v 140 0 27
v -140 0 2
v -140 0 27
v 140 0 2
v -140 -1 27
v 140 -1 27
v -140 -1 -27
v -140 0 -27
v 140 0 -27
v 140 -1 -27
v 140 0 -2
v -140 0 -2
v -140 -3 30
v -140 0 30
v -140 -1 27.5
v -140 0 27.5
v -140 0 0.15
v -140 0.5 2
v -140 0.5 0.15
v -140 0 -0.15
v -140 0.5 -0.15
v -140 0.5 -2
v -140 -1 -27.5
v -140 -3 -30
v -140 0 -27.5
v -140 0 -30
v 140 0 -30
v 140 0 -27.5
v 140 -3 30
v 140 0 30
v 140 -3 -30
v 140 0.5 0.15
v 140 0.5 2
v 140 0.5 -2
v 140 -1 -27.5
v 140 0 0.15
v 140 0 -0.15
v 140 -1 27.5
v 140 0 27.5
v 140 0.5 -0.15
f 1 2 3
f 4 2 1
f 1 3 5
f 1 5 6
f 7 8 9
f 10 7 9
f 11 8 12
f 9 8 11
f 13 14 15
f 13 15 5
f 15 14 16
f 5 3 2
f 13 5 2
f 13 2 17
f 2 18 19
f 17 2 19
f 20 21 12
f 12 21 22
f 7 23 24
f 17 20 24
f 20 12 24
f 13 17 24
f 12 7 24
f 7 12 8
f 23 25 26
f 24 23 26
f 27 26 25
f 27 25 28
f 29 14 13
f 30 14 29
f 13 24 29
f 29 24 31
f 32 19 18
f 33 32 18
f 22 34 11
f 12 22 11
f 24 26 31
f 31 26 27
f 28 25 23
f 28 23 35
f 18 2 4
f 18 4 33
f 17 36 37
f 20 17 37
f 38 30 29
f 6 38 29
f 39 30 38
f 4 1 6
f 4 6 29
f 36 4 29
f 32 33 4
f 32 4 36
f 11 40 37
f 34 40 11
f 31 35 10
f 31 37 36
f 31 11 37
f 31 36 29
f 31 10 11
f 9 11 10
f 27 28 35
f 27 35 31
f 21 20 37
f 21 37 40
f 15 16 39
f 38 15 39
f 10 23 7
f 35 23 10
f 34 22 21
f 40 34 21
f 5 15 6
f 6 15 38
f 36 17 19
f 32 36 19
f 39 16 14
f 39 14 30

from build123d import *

# Parameters (mm, degrees)
SKETCH1_W           = 280
SKETCH1_H           = 60
BOSS_EXTRUDE1_DEPTH = 3
SKETCH1_9_W         = 280
SKETCH1_9_H         = 0.5
CUT_EXTRUDE1_DEPTH  = 1
BOSS_EXTRUDE2_DEPTH = 280
SKETCH3_W           = 0.3
SKETCH3_H           = 0.5
CUT_EXTRUDE5_DEPTH  = 280


with BuildPart() as part:
    # Sketch1 → Boss-Extrude1 (new body)
    with BuildSketch(Plane(origin=(0, 0, 0), x_dir=(1, 0, 0), z_dir=(0, 1, 0))):
        Rectangle(SKETCH1_W, SKETCH1_H)
    extrude(amount=-BOSS_EXTRUDE1_DEPTH)

    # Sketch1<9> → Cut-Extrude1 (cut)
    with BuildSketch(Plane(origin=(0, 0, 0), x_dir=(1, 0, 0), z_dir=(0, 1, 0))):
        with Locations((0, 27.25)):
            Rectangle(SKETCH1_9_W, SKETCH1_9_H)
    cut_extrude1 = extrude(amount=-CUT_EXTRUDE1_DEPTH, mode=Mode.SUBTRACT)

    # Mirror1: Cut-Extrude1 across plane
    add(cut_extrude1.mirror(Plane.XY), mode=Mode.SUBTRACT)

    # Sketch2 → Boss-Extrude2 (add)
    with BuildSketch(Plane(origin=(140, 0, 0), x_dir=(0, 0, -1), z_dir=(1, 0, 0))):
        Polygon((0, 0.5), (2, 0.5), (2, 0), (-2, 0), (-2, 0.5), align=None)
    extrude(amount=-BOSS_EXTRUDE2_DEPTH)

    # Sketch3 → Cut-Extrude5 (cut)
    with BuildSketch(Plane(origin=(140, 0, 0), x_dir=(0, 0, -1), z_dir=(1, 0, 0))):
        with Locations((0, 0.25)):
            Rectangle(SKETCH3_W, SKETCH3_H)
    extrude(amount=-CUT_EXTRUDE5_DEPTH, mode=Mode.SUBTRACT)


solid = part.part
